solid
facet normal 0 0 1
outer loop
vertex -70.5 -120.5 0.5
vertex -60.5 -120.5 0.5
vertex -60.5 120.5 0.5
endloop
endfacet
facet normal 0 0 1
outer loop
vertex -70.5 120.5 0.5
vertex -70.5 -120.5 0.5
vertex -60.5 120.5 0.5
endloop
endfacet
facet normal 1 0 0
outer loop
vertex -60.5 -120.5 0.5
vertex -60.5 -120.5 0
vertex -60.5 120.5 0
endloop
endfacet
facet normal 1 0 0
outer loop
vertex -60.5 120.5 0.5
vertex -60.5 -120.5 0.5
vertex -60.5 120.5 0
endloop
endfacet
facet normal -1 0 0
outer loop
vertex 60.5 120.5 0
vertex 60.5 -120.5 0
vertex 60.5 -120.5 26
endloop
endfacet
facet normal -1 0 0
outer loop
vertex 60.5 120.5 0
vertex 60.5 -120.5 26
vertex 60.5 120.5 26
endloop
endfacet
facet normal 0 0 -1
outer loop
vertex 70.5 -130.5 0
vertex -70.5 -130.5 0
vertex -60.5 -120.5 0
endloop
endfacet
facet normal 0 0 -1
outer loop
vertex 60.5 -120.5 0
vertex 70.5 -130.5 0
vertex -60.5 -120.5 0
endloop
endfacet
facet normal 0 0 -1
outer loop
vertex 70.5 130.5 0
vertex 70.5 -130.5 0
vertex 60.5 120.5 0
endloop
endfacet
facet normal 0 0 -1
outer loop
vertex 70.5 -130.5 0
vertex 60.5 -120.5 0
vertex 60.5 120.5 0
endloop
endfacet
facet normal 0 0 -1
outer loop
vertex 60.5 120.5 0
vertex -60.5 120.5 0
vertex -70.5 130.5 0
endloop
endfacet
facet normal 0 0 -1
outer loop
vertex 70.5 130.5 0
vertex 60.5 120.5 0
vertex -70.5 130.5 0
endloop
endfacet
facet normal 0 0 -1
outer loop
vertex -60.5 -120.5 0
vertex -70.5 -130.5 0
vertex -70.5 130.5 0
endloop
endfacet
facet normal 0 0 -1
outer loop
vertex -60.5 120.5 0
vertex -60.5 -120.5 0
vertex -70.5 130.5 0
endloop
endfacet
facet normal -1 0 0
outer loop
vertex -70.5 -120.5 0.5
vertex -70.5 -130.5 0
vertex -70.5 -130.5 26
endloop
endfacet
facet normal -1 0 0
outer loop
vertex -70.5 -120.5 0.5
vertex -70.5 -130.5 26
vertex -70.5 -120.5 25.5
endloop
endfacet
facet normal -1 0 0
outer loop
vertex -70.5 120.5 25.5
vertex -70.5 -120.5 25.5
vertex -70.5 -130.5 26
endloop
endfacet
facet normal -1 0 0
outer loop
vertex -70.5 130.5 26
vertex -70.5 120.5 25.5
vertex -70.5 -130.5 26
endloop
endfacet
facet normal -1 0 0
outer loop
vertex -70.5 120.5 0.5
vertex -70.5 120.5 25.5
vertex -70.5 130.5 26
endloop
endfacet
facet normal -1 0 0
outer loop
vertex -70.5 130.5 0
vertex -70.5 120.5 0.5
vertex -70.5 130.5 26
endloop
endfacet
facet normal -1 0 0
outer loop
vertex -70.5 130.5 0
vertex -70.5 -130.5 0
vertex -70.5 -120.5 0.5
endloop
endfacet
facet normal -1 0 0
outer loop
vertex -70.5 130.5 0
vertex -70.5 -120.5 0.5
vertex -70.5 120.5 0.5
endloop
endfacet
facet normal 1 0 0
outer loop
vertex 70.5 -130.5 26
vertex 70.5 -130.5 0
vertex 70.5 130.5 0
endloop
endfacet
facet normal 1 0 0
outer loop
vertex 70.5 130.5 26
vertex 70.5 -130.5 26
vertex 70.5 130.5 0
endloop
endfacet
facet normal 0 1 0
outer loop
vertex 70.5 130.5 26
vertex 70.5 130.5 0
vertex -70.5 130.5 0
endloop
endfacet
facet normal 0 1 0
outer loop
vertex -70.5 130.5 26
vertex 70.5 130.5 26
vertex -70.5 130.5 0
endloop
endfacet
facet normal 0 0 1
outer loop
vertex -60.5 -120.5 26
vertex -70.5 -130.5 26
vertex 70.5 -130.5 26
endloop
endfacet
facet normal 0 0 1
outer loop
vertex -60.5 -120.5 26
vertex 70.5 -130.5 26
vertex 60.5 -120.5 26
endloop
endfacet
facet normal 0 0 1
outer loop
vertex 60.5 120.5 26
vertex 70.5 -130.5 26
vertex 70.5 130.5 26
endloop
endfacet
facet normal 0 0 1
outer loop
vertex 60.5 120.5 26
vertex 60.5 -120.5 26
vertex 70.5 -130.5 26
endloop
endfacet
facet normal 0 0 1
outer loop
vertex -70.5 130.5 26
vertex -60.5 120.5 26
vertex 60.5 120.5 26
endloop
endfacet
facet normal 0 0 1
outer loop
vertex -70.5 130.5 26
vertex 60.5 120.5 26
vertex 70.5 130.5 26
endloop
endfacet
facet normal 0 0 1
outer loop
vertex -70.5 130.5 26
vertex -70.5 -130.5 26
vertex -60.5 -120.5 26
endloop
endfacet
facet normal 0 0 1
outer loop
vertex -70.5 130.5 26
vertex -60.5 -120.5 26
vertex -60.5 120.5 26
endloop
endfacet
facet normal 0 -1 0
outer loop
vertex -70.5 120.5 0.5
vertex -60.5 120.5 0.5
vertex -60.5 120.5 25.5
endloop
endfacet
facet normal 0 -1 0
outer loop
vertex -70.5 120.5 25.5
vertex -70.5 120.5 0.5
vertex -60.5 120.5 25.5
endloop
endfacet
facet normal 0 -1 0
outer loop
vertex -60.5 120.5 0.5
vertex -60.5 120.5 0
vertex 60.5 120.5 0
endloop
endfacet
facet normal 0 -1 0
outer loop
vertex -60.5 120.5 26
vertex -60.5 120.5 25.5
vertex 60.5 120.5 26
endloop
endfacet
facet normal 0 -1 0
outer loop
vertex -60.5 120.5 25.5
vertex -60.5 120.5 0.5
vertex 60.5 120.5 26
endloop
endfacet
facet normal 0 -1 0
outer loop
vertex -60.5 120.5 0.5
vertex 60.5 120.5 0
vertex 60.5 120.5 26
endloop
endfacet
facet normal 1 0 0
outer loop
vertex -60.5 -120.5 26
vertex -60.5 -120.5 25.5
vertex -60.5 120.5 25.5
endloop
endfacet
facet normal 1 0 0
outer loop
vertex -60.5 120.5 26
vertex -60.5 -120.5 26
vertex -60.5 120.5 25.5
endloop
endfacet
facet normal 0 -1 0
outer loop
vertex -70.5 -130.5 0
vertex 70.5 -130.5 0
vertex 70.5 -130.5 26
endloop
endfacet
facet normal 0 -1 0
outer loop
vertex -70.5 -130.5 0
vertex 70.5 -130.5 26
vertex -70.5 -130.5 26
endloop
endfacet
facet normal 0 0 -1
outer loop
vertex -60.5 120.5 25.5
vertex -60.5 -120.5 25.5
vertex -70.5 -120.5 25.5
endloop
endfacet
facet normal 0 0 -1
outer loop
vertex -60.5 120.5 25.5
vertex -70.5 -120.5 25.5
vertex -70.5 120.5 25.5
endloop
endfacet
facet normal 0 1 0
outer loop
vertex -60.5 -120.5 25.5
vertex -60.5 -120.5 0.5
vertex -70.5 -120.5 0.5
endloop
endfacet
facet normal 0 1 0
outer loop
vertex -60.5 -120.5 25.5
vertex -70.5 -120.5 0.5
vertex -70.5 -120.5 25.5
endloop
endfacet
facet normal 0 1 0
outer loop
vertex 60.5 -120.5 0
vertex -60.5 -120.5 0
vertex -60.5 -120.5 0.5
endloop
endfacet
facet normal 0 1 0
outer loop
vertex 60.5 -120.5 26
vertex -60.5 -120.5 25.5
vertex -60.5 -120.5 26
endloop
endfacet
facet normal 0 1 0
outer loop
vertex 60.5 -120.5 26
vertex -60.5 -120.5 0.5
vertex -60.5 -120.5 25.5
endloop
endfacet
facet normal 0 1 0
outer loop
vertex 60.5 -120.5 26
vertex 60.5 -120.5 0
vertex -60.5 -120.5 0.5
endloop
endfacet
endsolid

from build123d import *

# Parameters (mm, degrees)
SKETCH2_W           = 261
SKETCH2_H           = 141
SKETCH2_W_2         = 241
SKETCH2_H_2         = 121
BOSS_EXTRUDE1_DEPTH = 26
SKETCH4_W           = 241
SKETCH4_H           = 25
CUT_EXTRUDE1_DEPTH  = 187.727742984


with BuildPart() as part:
    # Sketch2 → Boss-Extrude1 (new body)
    with BuildSketch(Plane(origin=(0, 0, 0), x_dir=(0, 1, 0), z_dir=(0, 0, 1))):
        Rectangle(SKETCH2_W, SKETCH2_H)
        Rectangle(SKETCH2_W_2, SKETCH2_H_2, mode=Mode.SUBTRACT)
    extrude(amount=BOSS_EXTRUDE1_DEPTH)

    # Sketch4 → Cut-Extrude1 (cut, through all)
    with BuildSketch(Plane.YZ.offset(-60.5)):
        with Locations((0, 13)):
            Rectangle(SKETCH4_W, SKETCH4_H)
    extrude(amount=-CUT_EXTRUDE1_DEPTH, mode=Mode.SUBTRACT)


solid = part.part
